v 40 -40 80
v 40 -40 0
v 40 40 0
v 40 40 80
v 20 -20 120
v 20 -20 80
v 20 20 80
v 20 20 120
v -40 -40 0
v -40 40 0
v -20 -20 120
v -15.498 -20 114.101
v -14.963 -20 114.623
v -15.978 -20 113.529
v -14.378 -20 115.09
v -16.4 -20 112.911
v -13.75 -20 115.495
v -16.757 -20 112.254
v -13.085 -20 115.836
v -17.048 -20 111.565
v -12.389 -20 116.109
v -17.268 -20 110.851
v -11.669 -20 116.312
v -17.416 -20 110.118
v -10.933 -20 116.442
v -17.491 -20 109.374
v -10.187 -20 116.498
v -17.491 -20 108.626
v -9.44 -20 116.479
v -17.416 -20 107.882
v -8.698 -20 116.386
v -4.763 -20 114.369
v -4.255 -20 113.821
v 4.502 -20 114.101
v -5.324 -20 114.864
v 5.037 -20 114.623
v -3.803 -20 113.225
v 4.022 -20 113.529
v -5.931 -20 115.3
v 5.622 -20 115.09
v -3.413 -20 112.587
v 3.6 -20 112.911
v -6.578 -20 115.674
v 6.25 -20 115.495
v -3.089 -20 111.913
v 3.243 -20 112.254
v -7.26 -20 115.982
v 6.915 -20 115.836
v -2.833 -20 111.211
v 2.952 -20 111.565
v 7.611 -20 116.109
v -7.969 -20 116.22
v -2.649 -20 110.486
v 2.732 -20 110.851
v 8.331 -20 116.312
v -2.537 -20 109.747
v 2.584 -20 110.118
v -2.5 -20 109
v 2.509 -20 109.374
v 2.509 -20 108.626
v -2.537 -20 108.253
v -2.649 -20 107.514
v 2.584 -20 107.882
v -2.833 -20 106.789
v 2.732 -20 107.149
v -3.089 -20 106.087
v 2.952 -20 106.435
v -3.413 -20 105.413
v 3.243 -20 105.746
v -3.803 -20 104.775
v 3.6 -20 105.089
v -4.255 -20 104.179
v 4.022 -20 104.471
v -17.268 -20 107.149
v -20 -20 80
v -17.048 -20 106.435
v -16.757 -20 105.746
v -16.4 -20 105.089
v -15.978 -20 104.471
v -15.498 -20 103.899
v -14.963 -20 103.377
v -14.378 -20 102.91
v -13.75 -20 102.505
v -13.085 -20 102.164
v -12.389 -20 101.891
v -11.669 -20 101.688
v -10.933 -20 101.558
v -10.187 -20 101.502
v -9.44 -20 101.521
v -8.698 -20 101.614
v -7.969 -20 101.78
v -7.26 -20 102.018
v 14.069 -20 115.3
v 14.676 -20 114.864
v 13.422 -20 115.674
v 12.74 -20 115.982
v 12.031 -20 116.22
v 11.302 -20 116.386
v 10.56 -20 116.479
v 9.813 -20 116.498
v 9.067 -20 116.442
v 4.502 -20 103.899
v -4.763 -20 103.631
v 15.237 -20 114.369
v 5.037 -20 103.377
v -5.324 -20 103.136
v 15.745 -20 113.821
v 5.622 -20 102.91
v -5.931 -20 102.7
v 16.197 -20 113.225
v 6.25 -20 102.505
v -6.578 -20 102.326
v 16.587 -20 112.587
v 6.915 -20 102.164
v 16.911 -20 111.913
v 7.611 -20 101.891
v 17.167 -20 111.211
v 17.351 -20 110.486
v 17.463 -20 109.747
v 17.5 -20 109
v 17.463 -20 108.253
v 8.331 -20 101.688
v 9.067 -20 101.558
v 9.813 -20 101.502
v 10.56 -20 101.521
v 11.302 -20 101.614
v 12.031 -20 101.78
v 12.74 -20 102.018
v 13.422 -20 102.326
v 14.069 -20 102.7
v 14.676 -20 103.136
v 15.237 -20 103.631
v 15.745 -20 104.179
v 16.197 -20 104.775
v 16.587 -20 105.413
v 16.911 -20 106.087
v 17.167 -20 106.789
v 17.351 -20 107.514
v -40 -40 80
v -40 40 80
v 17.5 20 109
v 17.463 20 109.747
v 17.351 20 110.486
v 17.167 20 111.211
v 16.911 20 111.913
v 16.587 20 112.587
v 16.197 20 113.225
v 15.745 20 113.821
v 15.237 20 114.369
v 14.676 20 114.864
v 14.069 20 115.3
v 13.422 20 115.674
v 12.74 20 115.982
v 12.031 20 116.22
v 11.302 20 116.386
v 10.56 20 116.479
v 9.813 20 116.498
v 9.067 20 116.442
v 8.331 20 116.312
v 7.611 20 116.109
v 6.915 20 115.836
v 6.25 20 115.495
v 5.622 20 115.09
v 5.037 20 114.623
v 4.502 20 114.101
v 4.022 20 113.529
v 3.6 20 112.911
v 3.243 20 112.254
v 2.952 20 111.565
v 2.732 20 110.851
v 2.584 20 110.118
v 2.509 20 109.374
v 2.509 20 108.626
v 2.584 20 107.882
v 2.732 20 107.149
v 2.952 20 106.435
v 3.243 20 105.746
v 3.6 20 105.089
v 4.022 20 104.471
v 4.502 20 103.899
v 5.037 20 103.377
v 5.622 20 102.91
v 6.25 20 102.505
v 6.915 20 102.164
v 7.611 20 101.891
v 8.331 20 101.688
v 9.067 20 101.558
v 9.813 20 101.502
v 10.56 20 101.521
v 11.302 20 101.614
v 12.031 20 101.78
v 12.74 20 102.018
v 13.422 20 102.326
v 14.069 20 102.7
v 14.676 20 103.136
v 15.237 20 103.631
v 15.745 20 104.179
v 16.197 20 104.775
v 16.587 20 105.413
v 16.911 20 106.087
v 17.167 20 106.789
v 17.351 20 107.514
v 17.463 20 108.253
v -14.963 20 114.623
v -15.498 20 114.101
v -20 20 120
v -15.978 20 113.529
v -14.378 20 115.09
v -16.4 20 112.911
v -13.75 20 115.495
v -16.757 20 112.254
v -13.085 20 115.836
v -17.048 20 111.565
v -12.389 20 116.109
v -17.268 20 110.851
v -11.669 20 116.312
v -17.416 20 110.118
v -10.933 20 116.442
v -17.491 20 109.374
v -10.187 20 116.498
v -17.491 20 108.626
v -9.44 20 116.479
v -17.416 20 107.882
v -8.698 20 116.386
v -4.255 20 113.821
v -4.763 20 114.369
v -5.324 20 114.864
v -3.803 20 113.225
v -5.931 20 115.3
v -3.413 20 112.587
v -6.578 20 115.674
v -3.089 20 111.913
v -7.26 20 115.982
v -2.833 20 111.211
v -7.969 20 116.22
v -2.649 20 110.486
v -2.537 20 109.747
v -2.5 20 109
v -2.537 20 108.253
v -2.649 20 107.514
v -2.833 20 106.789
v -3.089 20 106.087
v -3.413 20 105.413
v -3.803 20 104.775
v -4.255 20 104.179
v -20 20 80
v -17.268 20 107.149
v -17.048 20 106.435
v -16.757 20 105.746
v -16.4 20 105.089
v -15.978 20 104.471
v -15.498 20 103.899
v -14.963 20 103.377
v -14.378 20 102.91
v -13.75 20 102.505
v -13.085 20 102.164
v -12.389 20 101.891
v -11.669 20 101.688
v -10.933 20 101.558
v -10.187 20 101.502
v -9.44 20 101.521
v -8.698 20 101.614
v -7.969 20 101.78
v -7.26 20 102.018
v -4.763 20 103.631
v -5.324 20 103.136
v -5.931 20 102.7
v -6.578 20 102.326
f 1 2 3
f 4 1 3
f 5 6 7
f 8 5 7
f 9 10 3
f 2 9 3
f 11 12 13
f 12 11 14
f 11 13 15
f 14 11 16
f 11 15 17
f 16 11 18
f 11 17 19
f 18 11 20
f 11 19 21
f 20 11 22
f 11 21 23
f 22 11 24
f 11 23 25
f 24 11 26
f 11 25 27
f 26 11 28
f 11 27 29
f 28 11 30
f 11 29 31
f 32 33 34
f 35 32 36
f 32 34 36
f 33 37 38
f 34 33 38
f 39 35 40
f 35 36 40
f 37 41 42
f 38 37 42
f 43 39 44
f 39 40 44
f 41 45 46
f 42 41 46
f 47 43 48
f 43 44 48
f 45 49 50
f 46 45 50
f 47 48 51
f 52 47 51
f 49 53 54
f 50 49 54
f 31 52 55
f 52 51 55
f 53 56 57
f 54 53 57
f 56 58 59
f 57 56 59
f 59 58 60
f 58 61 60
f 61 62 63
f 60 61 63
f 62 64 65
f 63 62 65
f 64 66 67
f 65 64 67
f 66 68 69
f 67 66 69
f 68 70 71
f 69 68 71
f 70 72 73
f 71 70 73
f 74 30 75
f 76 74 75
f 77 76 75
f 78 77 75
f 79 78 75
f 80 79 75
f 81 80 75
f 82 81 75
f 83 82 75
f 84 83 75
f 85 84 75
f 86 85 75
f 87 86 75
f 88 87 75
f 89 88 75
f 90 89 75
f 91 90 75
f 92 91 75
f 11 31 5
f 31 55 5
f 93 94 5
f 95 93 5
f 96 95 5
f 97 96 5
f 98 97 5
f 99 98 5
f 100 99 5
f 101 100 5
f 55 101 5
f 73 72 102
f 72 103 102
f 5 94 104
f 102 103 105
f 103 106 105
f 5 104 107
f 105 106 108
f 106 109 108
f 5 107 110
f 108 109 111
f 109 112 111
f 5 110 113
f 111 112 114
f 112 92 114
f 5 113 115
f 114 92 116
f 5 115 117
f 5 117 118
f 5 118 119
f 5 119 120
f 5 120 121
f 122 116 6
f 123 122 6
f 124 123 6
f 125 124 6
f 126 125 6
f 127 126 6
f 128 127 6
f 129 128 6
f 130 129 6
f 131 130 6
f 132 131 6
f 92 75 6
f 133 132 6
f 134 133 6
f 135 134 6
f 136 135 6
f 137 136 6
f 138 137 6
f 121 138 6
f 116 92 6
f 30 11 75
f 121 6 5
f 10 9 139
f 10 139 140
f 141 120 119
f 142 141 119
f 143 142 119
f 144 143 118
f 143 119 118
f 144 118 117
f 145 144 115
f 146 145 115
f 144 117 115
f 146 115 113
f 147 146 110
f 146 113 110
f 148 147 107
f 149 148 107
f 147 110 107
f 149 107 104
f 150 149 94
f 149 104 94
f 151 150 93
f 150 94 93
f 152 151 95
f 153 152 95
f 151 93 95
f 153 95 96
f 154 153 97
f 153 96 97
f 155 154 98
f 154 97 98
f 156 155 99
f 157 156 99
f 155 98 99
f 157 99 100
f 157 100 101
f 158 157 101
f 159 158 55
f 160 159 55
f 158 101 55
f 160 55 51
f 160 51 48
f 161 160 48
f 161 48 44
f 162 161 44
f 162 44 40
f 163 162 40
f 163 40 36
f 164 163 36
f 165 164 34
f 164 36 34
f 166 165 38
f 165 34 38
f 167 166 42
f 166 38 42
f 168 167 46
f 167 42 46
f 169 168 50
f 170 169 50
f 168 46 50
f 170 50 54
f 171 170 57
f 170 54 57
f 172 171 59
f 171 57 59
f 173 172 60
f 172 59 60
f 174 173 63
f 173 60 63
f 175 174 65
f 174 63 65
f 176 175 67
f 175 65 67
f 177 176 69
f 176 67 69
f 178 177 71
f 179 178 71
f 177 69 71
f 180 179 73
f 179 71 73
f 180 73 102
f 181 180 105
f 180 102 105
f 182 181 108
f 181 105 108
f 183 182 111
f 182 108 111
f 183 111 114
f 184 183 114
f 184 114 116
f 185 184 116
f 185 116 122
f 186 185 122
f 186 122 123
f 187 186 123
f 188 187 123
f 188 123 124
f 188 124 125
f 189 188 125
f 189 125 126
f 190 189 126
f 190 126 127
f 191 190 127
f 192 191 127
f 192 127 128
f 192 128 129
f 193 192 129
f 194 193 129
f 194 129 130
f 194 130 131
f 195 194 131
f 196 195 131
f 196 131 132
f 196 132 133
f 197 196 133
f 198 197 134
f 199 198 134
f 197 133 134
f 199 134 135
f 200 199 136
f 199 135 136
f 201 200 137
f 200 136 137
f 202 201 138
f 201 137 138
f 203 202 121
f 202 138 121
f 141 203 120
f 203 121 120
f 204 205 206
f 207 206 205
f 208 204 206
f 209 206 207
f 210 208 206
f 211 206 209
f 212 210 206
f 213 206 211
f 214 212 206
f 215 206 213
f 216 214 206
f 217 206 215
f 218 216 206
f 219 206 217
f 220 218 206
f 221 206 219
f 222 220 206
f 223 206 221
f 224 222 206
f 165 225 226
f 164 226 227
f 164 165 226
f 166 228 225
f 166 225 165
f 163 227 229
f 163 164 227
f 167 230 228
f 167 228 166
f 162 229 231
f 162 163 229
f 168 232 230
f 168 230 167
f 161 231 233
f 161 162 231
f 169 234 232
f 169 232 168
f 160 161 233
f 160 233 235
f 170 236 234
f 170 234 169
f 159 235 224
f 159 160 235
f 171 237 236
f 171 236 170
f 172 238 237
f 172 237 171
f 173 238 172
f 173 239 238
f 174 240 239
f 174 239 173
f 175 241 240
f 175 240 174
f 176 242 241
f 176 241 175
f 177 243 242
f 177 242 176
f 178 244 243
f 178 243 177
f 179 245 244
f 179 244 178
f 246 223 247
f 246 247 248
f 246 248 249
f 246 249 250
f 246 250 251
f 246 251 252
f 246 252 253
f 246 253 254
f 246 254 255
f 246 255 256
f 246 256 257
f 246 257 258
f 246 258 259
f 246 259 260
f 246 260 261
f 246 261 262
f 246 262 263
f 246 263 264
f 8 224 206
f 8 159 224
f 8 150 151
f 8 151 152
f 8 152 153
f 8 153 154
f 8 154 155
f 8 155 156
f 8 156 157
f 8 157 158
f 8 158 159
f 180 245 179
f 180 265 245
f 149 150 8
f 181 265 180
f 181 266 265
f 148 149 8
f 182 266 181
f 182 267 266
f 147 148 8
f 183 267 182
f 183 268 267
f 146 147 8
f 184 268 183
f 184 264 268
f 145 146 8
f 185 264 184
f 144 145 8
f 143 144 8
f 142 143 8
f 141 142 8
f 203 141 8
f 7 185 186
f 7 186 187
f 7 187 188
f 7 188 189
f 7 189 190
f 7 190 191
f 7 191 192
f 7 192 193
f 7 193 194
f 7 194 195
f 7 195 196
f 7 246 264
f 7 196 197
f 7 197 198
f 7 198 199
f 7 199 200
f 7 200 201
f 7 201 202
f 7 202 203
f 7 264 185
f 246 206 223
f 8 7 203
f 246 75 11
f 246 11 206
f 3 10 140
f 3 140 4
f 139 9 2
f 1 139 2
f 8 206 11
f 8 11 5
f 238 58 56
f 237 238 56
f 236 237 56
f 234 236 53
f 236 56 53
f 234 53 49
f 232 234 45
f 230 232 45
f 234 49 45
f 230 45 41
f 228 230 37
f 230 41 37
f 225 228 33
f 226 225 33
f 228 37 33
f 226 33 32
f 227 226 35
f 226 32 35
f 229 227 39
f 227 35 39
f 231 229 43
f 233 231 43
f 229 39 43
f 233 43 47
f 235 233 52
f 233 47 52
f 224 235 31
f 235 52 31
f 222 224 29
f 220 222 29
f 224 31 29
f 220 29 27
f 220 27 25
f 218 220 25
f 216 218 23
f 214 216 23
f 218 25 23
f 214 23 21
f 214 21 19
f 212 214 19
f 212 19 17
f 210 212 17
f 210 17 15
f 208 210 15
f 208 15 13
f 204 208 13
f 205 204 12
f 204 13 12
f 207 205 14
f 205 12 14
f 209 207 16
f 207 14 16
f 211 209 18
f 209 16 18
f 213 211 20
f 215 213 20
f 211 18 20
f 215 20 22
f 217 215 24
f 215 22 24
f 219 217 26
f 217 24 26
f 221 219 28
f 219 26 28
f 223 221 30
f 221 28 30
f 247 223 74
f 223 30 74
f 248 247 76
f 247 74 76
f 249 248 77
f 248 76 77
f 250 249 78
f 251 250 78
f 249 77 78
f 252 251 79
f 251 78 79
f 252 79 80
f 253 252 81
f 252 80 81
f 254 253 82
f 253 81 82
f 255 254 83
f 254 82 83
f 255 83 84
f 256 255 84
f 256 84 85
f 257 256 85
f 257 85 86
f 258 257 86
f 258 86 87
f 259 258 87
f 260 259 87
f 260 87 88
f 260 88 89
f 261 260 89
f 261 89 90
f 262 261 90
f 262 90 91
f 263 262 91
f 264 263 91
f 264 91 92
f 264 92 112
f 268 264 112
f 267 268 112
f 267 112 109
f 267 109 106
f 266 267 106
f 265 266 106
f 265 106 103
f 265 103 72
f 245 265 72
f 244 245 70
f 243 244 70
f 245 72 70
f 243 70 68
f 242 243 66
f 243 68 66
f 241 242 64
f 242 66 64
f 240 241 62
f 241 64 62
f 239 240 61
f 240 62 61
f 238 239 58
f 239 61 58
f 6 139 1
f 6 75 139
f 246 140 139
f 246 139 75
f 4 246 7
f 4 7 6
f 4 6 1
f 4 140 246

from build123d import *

# Parameters (mm, degrees)
F0_W     = 80
F0_H     = 80
F1_DEPTH = 80
F2_W     = 40
F2_H     = 40
F3_DEPTH = 40
F4_R     = 7.5
F5_DEPTH = 40
F6_R     = 7.5
F7_DEPTH = 40


with BuildPart() as f1:
    # F0 (on Top) → F1 (new body)
    with BuildSketch(Plane.XY):
        Rectangle(F0_W, F0_H)
    extrude(amount=F1_DEPTH)

    # F2 (on face) → F3 (join)
    with BuildSketch(Plane.XY.offset(80)):
        Rectangle(F2_W, F2_H)
    extrude(amount=F3_DEPTH)

    # F4 (on face) → F5 (cut)
    with BuildSketch(Plane.XZ.offset(20)):
        with Locations((-10, 109)):
            Circle(F4_R)
    extrude(amount=-F5_DEPTH, mode=Mode.SUBTRACT)

    # F6 (on face) → F7 (cut)
    with BuildSketch(Plane.XZ.offset(20)):
        with Locations((10, 109)):
            Circle(F6_R)
    extrude(amount=-F7_DEPTH, mode=Mode.SUBTRACT)


solid = f1.part
